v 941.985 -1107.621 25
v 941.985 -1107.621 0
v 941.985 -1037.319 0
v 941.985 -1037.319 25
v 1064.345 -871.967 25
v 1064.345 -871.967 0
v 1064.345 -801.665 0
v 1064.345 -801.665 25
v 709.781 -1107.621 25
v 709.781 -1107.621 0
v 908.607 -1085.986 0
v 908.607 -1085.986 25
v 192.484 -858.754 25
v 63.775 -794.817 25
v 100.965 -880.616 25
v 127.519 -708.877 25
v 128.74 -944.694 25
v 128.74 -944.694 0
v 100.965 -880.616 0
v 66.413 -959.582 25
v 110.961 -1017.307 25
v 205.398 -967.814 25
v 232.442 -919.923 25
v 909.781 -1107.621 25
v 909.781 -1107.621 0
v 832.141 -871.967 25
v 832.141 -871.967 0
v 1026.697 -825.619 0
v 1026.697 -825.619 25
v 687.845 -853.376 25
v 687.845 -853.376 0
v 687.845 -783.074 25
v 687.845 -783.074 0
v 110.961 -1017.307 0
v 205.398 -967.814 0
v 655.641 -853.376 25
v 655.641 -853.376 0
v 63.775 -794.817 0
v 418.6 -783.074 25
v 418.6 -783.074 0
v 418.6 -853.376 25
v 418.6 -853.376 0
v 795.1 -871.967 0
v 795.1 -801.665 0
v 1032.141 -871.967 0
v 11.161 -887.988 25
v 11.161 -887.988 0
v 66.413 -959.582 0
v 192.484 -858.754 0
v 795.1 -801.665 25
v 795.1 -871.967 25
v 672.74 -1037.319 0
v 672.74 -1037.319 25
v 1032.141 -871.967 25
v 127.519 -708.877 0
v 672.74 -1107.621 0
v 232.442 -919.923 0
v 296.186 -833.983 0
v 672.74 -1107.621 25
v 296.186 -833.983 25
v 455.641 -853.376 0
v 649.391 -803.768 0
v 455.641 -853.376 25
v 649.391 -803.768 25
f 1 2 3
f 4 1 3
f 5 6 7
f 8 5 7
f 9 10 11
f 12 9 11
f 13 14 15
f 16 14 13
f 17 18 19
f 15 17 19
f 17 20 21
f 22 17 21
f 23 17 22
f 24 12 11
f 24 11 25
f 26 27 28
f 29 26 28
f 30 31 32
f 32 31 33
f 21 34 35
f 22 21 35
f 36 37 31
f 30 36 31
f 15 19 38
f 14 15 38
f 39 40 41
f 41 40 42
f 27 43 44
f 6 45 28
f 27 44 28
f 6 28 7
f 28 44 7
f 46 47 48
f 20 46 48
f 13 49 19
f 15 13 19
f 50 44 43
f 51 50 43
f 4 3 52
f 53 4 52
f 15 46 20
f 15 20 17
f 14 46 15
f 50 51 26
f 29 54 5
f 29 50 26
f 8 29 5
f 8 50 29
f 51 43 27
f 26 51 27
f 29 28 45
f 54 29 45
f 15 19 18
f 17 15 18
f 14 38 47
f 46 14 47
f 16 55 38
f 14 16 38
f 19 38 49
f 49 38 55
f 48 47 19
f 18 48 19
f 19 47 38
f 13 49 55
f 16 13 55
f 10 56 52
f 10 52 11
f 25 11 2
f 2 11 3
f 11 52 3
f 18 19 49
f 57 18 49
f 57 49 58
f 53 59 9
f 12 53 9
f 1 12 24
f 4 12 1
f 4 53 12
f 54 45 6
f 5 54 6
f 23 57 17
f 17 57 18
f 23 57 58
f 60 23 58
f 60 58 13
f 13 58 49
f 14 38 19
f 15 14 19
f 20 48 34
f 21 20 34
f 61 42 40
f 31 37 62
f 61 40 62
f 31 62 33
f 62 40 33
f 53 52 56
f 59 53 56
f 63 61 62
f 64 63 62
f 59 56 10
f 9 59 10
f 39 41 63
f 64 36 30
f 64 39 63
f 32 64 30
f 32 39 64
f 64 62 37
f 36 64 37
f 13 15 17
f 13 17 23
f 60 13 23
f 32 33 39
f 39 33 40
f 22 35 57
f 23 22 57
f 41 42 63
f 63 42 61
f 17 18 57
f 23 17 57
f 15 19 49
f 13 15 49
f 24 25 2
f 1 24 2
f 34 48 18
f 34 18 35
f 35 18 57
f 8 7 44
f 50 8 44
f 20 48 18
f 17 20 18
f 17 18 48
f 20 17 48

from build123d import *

# Parameters (mm, degrees)
F3_DEPTH = 25
F4_DEPTH = 25
F5_DEPTH = 25
F6_DEPTH = 25
F7_DEPTH = 25
F8_DEPTH = 25
F9_DEPTH = 25


with BuildPart() as f3:
    # F2 (on Top) → F3 (new body)
    with BuildSketch(Plane.XY):
        Polygon((418.599508, -853.375829), (455.640994, -853.375829), (649.390994, -803.767992), (655.640994, -853.375829), (687.844723, -853.375829), (687.844723, -783.074455), (418.599508, -783.074455), align=None)
    extrude(amount=F3_DEPTH)


with BuildPart() as f4:
    # F2 (on Top) → F4 (new body)
    with BuildSketch(Plane.XY):
        Polygon((795.09985, -871.966783), (832.141335, -871.966783), (1026.696891, -825.618797), (1032.141335, -871.966783), (1064.345064, -871.966783), (1064.345064, -801.66541), (795.09985, -801.66541), align=None)
    extrude(amount=F4_DEPTH)


with BuildPart() as f5:
    # F2 (on Top) → F5 (new body)
    with BuildSketch(Plane.XY):
        Polygon((672.73962, -1107.620541), (709.781106, -1107.620541), (908.607495, -1085.985683), (909.781106, -1107.620541), (941.984834, -1107.620541), (941.984834, -1037.319168), (672.73962, -1037.319168), align=None)
    extrude(amount=F5_DEPTH)


with BuildPart() as f6:
    # F1 (on Top) → F6 (new body)
    with BuildSketch(Plane.XY):
        Polygon((100.964538, -880.615691), (192.483972, -858.754409), (127.519154, -708.877385), (63.774859, -794.817276), align=None)
    extrude(amount=F6_DEPTH)


with BuildPart() as f7:
    # F1 (on Top) → F7 (new body)
    with BuildSketch(Plane.XY):
        Polygon((232.441935, -919.922901), (296.18623, -833.98301), (192.483972, -858.754409), (100.964538, -880.615691), (128.739677, -944.6943), align=None)
    extrude(amount=F7_DEPTH)


with BuildPart() as f8:
    # F1 (on Top) → F8 (new body)
    with BuildSketch(Plane.XY):
        Polygon((128.739677, -944.6943), (100.964538, -880.615691), (63.774859, -794.817276), (11.16119, -887.988097), (66.412814, -959.582342), align=None)
    extrude(amount=F8_DEPTH)


with BuildPart() as f9:
    # F1 (on Top) → F9 (new body)
    with BuildSketch(Plane.XY):
        Polygon((205.397526, -967.814445), (232.441935, -919.922901), (128.739677, -944.6943), (66.412814, -959.582342), (110.961206, -1017.307495), align=None)
    extrude(amount=F9_DEPTH)


solid = Compound([f3.part, f4.part, f5.part, f6.part, f7.part, f8.part, f9.part])
